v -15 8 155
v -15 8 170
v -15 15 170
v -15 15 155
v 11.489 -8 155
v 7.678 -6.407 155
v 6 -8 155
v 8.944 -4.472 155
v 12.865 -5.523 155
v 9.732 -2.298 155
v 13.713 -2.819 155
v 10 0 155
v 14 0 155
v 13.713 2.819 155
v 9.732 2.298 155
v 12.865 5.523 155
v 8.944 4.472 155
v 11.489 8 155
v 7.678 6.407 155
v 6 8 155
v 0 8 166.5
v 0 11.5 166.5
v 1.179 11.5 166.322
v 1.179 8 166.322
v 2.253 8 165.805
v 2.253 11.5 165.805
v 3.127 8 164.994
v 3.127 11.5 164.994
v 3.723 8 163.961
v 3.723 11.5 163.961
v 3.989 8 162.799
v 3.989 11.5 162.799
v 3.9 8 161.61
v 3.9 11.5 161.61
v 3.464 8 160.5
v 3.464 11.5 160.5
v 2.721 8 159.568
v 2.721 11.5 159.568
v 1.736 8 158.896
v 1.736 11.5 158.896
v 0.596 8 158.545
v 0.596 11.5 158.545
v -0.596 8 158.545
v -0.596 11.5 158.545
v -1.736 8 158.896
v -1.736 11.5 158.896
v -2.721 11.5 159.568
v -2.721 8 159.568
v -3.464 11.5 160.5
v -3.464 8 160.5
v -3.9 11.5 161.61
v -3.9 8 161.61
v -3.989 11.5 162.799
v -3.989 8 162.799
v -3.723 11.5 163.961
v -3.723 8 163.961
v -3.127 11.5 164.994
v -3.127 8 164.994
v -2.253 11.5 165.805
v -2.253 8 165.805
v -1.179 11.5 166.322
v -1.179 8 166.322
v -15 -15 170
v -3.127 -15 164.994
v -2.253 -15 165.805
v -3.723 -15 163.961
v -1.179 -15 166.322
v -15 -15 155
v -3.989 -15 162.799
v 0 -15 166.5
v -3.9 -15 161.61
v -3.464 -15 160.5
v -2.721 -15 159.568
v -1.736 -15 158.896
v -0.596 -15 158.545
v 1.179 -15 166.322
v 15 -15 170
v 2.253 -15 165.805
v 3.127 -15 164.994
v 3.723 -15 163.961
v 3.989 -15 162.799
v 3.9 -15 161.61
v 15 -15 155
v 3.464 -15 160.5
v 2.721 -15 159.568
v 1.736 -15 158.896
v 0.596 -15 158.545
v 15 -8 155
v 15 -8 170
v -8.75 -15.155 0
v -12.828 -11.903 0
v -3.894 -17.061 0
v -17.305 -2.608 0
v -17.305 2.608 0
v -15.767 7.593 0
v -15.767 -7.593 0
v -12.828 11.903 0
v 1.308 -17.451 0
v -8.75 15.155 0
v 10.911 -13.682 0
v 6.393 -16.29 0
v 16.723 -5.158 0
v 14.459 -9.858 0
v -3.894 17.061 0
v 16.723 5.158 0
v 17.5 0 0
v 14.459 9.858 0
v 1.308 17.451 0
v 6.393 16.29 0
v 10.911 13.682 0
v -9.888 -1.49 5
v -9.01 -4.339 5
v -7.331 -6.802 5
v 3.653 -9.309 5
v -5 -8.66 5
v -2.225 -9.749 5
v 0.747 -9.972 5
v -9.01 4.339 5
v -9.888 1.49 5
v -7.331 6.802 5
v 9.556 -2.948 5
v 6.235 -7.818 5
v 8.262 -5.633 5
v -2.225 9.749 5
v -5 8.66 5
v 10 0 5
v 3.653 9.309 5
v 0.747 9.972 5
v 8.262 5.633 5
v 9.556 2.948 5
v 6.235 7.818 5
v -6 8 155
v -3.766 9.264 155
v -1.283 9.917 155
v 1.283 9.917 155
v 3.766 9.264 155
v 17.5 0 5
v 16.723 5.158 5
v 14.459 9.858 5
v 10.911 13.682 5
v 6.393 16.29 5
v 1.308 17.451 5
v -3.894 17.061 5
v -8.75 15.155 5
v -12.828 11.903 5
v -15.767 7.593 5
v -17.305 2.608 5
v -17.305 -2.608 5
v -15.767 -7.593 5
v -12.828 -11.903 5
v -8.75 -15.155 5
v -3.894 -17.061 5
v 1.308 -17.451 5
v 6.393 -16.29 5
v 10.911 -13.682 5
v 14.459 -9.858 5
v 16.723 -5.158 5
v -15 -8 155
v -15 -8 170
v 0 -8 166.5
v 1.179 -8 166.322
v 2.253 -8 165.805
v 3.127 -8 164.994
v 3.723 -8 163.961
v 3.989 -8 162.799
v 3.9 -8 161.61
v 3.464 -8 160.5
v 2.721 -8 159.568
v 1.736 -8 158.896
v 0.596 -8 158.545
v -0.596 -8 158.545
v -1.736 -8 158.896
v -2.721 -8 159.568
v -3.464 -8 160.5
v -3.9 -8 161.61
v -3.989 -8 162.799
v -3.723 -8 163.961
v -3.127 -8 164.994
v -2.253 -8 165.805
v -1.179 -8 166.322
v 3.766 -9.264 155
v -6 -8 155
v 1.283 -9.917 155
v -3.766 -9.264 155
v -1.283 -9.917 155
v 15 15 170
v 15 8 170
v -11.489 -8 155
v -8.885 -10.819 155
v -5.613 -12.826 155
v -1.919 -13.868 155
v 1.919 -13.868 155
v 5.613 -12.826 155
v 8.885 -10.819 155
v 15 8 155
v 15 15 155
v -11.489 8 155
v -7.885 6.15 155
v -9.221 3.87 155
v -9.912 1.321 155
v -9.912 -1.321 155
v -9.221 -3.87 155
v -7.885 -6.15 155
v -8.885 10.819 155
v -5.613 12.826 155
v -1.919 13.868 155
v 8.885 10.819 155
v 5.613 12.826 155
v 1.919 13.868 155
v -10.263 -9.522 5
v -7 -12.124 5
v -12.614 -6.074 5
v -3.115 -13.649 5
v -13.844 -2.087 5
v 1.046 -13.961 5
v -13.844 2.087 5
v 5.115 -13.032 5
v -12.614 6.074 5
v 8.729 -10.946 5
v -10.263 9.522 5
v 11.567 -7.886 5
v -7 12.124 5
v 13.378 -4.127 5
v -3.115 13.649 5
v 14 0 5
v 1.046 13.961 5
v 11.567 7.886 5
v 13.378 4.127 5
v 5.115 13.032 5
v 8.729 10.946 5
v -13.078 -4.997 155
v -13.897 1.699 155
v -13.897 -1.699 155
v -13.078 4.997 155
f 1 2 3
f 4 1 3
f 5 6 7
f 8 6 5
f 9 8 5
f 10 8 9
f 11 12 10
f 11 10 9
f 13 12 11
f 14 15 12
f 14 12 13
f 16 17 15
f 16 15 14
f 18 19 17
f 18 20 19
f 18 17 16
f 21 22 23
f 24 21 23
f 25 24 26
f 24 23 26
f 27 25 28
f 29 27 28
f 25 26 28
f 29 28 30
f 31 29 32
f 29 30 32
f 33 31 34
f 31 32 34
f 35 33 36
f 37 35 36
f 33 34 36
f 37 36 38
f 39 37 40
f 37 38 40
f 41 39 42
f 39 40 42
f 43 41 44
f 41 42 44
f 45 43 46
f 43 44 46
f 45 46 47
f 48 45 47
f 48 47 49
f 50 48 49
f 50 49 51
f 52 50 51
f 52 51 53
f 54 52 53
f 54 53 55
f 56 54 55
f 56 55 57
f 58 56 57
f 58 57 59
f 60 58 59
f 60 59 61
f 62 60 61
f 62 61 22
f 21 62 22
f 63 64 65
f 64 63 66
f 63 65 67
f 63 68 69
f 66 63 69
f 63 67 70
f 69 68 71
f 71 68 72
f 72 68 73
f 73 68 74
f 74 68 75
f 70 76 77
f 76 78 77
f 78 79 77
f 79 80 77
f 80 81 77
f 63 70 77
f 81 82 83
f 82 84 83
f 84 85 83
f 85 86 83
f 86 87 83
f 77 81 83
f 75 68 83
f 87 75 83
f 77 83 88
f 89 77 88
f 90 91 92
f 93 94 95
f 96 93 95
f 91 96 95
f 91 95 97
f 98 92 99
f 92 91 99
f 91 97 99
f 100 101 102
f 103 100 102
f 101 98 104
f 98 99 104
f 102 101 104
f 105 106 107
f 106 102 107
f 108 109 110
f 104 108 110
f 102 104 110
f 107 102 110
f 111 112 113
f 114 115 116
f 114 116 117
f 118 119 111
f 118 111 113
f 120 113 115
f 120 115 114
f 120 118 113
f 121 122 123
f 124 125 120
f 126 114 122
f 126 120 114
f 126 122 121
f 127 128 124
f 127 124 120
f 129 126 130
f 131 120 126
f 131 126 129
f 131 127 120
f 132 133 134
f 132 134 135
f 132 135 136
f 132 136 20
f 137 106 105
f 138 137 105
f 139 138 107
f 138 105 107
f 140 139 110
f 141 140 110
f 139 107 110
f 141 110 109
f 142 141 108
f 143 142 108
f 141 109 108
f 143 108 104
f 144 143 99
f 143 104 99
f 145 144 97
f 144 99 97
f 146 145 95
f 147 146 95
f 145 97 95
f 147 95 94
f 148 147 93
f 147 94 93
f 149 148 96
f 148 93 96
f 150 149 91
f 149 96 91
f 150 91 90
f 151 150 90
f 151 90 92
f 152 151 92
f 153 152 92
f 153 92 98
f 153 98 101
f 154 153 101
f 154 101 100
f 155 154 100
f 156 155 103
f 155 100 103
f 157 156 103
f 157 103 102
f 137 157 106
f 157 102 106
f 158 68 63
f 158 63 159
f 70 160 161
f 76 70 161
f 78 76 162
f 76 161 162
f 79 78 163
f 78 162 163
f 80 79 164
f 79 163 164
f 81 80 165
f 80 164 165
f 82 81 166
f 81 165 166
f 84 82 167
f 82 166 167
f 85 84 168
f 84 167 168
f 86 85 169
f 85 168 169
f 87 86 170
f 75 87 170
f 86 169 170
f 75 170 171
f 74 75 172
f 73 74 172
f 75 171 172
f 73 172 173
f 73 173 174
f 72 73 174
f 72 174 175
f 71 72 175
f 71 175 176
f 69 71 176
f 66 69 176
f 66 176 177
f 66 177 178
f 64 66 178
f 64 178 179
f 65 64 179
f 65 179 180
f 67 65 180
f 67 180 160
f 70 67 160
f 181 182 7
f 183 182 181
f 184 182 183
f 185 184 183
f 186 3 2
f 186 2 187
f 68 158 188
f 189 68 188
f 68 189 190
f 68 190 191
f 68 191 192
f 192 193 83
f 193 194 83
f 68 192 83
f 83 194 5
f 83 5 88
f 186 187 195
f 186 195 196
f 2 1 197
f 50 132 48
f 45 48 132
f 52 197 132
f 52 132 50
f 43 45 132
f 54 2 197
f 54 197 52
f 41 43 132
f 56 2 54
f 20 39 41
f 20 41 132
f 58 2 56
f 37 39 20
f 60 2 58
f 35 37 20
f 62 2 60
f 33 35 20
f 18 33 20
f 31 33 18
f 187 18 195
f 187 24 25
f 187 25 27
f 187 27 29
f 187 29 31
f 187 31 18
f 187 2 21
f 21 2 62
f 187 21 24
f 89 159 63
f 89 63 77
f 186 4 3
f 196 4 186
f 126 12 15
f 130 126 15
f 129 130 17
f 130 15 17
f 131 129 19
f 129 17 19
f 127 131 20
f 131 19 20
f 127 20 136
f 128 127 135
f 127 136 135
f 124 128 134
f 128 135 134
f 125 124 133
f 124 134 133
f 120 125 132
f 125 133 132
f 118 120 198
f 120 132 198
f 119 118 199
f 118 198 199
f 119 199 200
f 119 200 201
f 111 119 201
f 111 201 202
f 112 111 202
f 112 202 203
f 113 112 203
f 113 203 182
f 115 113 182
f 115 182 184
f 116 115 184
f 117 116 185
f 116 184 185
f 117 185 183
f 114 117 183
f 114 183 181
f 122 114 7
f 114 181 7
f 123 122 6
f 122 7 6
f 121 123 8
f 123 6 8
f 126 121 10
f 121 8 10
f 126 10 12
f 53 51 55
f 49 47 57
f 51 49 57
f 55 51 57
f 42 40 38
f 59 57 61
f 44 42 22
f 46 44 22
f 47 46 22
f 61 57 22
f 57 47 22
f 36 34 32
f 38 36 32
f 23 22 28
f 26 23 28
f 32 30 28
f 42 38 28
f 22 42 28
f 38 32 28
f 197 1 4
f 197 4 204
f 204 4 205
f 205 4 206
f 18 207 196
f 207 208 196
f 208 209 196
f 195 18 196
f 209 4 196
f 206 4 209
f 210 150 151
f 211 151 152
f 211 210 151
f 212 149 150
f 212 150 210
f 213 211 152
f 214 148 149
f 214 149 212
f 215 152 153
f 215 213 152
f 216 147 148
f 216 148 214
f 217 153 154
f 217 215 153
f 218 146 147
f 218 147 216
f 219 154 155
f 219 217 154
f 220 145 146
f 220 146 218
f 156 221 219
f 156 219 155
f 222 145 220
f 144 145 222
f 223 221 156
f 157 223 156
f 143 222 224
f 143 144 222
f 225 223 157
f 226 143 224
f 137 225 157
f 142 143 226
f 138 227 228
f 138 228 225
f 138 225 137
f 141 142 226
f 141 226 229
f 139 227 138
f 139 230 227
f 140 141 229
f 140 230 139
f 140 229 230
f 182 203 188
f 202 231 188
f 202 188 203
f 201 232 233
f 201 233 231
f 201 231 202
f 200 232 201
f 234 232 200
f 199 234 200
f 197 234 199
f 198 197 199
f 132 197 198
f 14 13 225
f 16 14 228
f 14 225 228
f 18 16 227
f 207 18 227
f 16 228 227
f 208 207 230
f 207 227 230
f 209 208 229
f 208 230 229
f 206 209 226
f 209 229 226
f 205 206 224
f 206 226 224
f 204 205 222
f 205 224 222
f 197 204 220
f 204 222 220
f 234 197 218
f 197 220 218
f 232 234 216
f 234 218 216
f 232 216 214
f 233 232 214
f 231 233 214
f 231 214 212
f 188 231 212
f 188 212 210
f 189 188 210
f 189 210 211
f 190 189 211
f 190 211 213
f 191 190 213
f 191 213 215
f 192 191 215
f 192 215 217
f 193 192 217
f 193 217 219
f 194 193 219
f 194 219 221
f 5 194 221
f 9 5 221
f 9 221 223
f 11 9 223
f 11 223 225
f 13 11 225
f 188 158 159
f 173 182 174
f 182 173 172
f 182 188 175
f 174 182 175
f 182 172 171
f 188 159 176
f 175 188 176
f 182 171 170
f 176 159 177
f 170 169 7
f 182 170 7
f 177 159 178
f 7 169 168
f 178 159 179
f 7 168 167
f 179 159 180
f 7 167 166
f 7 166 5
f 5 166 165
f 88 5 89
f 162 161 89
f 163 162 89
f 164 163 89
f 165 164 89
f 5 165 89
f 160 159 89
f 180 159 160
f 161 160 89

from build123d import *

# Parameters (mm, degrees)
SKETCH1_R           = 17.5
BOSS_EXTRUDE1_DEPTH = 5
SKETCH2_R           = 14
BOSS_EXTRUDE2_DEPTH = 155
SKETCH3_R           = 10
CUT_EXTRUDE2_DEPTH  = 150
SKETCH4_W           = 30
SKETCH4_H           = 30
BOSS_EXTRUDE3_DEPTH = 15
SKETCH5_W           = 30
SKETCH5_H           = 16
CUT_EXTRUDE3_DEPTH  = 15
SKETCH6_R           = 4
CUT_EXTRUDE4_DEPTH  = 30


with BuildPart() as part:
    # Sketch1 → Boss-Extrude1 (new body)
    with BuildSketch(Plane.XY):
        Circle(SKETCH1_R)
    extrude(amount=BOSS_EXTRUDE1_DEPTH)

    # Sketch2 → Boss-Extrude2 (add)
    with BuildSketch(Plane.XY):
        Circle(SKETCH2_R)
    extrude(amount=BOSS_EXTRUDE2_DEPTH)

    # Sketch3 → Cut-Extrude2 (cut)
    with BuildSketch(Plane.XY.offset(155)):
        Circle(SKETCH3_R)
    extrude(amount=-CUT_EXTRUDE2_DEPTH, mode=Mode.SUBTRACT)

    # Sketch4 → Boss-Extrude3 (add)
    with BuildSketch(Plane.XY.offset(155)):
        Rectangle(SKETCH4_W, SKETCH4_H)
    extrude(amount=BOSS_EXTRUDE3_DEPTH)

    # Sketch5 → Cut-Extrude3 (cut)
    with BuildSketch(Plane.XY.offset(170)):
        Rectangle(SKETCH5_W, SKETCH5_H)
    extrude(amount=-CUT_EXTRUDE3_DEPTH, mode=Mode.SUBTRACT)

    # Sketch6 → Cut-Extrude4 (cut)
    with BuildSketch(Plane(origin=(0, 11.5, 0), x_dir=(1, 0, 0), z_dir=(0, 1, 0))):
        with Locations((0, -162.5)):
            Circle(SKETCH6_R)
    extrude(amount=-CUT_EXTRUDE4_DEPTH, mode=Mode.SUBTRACT)


solid = part.part
